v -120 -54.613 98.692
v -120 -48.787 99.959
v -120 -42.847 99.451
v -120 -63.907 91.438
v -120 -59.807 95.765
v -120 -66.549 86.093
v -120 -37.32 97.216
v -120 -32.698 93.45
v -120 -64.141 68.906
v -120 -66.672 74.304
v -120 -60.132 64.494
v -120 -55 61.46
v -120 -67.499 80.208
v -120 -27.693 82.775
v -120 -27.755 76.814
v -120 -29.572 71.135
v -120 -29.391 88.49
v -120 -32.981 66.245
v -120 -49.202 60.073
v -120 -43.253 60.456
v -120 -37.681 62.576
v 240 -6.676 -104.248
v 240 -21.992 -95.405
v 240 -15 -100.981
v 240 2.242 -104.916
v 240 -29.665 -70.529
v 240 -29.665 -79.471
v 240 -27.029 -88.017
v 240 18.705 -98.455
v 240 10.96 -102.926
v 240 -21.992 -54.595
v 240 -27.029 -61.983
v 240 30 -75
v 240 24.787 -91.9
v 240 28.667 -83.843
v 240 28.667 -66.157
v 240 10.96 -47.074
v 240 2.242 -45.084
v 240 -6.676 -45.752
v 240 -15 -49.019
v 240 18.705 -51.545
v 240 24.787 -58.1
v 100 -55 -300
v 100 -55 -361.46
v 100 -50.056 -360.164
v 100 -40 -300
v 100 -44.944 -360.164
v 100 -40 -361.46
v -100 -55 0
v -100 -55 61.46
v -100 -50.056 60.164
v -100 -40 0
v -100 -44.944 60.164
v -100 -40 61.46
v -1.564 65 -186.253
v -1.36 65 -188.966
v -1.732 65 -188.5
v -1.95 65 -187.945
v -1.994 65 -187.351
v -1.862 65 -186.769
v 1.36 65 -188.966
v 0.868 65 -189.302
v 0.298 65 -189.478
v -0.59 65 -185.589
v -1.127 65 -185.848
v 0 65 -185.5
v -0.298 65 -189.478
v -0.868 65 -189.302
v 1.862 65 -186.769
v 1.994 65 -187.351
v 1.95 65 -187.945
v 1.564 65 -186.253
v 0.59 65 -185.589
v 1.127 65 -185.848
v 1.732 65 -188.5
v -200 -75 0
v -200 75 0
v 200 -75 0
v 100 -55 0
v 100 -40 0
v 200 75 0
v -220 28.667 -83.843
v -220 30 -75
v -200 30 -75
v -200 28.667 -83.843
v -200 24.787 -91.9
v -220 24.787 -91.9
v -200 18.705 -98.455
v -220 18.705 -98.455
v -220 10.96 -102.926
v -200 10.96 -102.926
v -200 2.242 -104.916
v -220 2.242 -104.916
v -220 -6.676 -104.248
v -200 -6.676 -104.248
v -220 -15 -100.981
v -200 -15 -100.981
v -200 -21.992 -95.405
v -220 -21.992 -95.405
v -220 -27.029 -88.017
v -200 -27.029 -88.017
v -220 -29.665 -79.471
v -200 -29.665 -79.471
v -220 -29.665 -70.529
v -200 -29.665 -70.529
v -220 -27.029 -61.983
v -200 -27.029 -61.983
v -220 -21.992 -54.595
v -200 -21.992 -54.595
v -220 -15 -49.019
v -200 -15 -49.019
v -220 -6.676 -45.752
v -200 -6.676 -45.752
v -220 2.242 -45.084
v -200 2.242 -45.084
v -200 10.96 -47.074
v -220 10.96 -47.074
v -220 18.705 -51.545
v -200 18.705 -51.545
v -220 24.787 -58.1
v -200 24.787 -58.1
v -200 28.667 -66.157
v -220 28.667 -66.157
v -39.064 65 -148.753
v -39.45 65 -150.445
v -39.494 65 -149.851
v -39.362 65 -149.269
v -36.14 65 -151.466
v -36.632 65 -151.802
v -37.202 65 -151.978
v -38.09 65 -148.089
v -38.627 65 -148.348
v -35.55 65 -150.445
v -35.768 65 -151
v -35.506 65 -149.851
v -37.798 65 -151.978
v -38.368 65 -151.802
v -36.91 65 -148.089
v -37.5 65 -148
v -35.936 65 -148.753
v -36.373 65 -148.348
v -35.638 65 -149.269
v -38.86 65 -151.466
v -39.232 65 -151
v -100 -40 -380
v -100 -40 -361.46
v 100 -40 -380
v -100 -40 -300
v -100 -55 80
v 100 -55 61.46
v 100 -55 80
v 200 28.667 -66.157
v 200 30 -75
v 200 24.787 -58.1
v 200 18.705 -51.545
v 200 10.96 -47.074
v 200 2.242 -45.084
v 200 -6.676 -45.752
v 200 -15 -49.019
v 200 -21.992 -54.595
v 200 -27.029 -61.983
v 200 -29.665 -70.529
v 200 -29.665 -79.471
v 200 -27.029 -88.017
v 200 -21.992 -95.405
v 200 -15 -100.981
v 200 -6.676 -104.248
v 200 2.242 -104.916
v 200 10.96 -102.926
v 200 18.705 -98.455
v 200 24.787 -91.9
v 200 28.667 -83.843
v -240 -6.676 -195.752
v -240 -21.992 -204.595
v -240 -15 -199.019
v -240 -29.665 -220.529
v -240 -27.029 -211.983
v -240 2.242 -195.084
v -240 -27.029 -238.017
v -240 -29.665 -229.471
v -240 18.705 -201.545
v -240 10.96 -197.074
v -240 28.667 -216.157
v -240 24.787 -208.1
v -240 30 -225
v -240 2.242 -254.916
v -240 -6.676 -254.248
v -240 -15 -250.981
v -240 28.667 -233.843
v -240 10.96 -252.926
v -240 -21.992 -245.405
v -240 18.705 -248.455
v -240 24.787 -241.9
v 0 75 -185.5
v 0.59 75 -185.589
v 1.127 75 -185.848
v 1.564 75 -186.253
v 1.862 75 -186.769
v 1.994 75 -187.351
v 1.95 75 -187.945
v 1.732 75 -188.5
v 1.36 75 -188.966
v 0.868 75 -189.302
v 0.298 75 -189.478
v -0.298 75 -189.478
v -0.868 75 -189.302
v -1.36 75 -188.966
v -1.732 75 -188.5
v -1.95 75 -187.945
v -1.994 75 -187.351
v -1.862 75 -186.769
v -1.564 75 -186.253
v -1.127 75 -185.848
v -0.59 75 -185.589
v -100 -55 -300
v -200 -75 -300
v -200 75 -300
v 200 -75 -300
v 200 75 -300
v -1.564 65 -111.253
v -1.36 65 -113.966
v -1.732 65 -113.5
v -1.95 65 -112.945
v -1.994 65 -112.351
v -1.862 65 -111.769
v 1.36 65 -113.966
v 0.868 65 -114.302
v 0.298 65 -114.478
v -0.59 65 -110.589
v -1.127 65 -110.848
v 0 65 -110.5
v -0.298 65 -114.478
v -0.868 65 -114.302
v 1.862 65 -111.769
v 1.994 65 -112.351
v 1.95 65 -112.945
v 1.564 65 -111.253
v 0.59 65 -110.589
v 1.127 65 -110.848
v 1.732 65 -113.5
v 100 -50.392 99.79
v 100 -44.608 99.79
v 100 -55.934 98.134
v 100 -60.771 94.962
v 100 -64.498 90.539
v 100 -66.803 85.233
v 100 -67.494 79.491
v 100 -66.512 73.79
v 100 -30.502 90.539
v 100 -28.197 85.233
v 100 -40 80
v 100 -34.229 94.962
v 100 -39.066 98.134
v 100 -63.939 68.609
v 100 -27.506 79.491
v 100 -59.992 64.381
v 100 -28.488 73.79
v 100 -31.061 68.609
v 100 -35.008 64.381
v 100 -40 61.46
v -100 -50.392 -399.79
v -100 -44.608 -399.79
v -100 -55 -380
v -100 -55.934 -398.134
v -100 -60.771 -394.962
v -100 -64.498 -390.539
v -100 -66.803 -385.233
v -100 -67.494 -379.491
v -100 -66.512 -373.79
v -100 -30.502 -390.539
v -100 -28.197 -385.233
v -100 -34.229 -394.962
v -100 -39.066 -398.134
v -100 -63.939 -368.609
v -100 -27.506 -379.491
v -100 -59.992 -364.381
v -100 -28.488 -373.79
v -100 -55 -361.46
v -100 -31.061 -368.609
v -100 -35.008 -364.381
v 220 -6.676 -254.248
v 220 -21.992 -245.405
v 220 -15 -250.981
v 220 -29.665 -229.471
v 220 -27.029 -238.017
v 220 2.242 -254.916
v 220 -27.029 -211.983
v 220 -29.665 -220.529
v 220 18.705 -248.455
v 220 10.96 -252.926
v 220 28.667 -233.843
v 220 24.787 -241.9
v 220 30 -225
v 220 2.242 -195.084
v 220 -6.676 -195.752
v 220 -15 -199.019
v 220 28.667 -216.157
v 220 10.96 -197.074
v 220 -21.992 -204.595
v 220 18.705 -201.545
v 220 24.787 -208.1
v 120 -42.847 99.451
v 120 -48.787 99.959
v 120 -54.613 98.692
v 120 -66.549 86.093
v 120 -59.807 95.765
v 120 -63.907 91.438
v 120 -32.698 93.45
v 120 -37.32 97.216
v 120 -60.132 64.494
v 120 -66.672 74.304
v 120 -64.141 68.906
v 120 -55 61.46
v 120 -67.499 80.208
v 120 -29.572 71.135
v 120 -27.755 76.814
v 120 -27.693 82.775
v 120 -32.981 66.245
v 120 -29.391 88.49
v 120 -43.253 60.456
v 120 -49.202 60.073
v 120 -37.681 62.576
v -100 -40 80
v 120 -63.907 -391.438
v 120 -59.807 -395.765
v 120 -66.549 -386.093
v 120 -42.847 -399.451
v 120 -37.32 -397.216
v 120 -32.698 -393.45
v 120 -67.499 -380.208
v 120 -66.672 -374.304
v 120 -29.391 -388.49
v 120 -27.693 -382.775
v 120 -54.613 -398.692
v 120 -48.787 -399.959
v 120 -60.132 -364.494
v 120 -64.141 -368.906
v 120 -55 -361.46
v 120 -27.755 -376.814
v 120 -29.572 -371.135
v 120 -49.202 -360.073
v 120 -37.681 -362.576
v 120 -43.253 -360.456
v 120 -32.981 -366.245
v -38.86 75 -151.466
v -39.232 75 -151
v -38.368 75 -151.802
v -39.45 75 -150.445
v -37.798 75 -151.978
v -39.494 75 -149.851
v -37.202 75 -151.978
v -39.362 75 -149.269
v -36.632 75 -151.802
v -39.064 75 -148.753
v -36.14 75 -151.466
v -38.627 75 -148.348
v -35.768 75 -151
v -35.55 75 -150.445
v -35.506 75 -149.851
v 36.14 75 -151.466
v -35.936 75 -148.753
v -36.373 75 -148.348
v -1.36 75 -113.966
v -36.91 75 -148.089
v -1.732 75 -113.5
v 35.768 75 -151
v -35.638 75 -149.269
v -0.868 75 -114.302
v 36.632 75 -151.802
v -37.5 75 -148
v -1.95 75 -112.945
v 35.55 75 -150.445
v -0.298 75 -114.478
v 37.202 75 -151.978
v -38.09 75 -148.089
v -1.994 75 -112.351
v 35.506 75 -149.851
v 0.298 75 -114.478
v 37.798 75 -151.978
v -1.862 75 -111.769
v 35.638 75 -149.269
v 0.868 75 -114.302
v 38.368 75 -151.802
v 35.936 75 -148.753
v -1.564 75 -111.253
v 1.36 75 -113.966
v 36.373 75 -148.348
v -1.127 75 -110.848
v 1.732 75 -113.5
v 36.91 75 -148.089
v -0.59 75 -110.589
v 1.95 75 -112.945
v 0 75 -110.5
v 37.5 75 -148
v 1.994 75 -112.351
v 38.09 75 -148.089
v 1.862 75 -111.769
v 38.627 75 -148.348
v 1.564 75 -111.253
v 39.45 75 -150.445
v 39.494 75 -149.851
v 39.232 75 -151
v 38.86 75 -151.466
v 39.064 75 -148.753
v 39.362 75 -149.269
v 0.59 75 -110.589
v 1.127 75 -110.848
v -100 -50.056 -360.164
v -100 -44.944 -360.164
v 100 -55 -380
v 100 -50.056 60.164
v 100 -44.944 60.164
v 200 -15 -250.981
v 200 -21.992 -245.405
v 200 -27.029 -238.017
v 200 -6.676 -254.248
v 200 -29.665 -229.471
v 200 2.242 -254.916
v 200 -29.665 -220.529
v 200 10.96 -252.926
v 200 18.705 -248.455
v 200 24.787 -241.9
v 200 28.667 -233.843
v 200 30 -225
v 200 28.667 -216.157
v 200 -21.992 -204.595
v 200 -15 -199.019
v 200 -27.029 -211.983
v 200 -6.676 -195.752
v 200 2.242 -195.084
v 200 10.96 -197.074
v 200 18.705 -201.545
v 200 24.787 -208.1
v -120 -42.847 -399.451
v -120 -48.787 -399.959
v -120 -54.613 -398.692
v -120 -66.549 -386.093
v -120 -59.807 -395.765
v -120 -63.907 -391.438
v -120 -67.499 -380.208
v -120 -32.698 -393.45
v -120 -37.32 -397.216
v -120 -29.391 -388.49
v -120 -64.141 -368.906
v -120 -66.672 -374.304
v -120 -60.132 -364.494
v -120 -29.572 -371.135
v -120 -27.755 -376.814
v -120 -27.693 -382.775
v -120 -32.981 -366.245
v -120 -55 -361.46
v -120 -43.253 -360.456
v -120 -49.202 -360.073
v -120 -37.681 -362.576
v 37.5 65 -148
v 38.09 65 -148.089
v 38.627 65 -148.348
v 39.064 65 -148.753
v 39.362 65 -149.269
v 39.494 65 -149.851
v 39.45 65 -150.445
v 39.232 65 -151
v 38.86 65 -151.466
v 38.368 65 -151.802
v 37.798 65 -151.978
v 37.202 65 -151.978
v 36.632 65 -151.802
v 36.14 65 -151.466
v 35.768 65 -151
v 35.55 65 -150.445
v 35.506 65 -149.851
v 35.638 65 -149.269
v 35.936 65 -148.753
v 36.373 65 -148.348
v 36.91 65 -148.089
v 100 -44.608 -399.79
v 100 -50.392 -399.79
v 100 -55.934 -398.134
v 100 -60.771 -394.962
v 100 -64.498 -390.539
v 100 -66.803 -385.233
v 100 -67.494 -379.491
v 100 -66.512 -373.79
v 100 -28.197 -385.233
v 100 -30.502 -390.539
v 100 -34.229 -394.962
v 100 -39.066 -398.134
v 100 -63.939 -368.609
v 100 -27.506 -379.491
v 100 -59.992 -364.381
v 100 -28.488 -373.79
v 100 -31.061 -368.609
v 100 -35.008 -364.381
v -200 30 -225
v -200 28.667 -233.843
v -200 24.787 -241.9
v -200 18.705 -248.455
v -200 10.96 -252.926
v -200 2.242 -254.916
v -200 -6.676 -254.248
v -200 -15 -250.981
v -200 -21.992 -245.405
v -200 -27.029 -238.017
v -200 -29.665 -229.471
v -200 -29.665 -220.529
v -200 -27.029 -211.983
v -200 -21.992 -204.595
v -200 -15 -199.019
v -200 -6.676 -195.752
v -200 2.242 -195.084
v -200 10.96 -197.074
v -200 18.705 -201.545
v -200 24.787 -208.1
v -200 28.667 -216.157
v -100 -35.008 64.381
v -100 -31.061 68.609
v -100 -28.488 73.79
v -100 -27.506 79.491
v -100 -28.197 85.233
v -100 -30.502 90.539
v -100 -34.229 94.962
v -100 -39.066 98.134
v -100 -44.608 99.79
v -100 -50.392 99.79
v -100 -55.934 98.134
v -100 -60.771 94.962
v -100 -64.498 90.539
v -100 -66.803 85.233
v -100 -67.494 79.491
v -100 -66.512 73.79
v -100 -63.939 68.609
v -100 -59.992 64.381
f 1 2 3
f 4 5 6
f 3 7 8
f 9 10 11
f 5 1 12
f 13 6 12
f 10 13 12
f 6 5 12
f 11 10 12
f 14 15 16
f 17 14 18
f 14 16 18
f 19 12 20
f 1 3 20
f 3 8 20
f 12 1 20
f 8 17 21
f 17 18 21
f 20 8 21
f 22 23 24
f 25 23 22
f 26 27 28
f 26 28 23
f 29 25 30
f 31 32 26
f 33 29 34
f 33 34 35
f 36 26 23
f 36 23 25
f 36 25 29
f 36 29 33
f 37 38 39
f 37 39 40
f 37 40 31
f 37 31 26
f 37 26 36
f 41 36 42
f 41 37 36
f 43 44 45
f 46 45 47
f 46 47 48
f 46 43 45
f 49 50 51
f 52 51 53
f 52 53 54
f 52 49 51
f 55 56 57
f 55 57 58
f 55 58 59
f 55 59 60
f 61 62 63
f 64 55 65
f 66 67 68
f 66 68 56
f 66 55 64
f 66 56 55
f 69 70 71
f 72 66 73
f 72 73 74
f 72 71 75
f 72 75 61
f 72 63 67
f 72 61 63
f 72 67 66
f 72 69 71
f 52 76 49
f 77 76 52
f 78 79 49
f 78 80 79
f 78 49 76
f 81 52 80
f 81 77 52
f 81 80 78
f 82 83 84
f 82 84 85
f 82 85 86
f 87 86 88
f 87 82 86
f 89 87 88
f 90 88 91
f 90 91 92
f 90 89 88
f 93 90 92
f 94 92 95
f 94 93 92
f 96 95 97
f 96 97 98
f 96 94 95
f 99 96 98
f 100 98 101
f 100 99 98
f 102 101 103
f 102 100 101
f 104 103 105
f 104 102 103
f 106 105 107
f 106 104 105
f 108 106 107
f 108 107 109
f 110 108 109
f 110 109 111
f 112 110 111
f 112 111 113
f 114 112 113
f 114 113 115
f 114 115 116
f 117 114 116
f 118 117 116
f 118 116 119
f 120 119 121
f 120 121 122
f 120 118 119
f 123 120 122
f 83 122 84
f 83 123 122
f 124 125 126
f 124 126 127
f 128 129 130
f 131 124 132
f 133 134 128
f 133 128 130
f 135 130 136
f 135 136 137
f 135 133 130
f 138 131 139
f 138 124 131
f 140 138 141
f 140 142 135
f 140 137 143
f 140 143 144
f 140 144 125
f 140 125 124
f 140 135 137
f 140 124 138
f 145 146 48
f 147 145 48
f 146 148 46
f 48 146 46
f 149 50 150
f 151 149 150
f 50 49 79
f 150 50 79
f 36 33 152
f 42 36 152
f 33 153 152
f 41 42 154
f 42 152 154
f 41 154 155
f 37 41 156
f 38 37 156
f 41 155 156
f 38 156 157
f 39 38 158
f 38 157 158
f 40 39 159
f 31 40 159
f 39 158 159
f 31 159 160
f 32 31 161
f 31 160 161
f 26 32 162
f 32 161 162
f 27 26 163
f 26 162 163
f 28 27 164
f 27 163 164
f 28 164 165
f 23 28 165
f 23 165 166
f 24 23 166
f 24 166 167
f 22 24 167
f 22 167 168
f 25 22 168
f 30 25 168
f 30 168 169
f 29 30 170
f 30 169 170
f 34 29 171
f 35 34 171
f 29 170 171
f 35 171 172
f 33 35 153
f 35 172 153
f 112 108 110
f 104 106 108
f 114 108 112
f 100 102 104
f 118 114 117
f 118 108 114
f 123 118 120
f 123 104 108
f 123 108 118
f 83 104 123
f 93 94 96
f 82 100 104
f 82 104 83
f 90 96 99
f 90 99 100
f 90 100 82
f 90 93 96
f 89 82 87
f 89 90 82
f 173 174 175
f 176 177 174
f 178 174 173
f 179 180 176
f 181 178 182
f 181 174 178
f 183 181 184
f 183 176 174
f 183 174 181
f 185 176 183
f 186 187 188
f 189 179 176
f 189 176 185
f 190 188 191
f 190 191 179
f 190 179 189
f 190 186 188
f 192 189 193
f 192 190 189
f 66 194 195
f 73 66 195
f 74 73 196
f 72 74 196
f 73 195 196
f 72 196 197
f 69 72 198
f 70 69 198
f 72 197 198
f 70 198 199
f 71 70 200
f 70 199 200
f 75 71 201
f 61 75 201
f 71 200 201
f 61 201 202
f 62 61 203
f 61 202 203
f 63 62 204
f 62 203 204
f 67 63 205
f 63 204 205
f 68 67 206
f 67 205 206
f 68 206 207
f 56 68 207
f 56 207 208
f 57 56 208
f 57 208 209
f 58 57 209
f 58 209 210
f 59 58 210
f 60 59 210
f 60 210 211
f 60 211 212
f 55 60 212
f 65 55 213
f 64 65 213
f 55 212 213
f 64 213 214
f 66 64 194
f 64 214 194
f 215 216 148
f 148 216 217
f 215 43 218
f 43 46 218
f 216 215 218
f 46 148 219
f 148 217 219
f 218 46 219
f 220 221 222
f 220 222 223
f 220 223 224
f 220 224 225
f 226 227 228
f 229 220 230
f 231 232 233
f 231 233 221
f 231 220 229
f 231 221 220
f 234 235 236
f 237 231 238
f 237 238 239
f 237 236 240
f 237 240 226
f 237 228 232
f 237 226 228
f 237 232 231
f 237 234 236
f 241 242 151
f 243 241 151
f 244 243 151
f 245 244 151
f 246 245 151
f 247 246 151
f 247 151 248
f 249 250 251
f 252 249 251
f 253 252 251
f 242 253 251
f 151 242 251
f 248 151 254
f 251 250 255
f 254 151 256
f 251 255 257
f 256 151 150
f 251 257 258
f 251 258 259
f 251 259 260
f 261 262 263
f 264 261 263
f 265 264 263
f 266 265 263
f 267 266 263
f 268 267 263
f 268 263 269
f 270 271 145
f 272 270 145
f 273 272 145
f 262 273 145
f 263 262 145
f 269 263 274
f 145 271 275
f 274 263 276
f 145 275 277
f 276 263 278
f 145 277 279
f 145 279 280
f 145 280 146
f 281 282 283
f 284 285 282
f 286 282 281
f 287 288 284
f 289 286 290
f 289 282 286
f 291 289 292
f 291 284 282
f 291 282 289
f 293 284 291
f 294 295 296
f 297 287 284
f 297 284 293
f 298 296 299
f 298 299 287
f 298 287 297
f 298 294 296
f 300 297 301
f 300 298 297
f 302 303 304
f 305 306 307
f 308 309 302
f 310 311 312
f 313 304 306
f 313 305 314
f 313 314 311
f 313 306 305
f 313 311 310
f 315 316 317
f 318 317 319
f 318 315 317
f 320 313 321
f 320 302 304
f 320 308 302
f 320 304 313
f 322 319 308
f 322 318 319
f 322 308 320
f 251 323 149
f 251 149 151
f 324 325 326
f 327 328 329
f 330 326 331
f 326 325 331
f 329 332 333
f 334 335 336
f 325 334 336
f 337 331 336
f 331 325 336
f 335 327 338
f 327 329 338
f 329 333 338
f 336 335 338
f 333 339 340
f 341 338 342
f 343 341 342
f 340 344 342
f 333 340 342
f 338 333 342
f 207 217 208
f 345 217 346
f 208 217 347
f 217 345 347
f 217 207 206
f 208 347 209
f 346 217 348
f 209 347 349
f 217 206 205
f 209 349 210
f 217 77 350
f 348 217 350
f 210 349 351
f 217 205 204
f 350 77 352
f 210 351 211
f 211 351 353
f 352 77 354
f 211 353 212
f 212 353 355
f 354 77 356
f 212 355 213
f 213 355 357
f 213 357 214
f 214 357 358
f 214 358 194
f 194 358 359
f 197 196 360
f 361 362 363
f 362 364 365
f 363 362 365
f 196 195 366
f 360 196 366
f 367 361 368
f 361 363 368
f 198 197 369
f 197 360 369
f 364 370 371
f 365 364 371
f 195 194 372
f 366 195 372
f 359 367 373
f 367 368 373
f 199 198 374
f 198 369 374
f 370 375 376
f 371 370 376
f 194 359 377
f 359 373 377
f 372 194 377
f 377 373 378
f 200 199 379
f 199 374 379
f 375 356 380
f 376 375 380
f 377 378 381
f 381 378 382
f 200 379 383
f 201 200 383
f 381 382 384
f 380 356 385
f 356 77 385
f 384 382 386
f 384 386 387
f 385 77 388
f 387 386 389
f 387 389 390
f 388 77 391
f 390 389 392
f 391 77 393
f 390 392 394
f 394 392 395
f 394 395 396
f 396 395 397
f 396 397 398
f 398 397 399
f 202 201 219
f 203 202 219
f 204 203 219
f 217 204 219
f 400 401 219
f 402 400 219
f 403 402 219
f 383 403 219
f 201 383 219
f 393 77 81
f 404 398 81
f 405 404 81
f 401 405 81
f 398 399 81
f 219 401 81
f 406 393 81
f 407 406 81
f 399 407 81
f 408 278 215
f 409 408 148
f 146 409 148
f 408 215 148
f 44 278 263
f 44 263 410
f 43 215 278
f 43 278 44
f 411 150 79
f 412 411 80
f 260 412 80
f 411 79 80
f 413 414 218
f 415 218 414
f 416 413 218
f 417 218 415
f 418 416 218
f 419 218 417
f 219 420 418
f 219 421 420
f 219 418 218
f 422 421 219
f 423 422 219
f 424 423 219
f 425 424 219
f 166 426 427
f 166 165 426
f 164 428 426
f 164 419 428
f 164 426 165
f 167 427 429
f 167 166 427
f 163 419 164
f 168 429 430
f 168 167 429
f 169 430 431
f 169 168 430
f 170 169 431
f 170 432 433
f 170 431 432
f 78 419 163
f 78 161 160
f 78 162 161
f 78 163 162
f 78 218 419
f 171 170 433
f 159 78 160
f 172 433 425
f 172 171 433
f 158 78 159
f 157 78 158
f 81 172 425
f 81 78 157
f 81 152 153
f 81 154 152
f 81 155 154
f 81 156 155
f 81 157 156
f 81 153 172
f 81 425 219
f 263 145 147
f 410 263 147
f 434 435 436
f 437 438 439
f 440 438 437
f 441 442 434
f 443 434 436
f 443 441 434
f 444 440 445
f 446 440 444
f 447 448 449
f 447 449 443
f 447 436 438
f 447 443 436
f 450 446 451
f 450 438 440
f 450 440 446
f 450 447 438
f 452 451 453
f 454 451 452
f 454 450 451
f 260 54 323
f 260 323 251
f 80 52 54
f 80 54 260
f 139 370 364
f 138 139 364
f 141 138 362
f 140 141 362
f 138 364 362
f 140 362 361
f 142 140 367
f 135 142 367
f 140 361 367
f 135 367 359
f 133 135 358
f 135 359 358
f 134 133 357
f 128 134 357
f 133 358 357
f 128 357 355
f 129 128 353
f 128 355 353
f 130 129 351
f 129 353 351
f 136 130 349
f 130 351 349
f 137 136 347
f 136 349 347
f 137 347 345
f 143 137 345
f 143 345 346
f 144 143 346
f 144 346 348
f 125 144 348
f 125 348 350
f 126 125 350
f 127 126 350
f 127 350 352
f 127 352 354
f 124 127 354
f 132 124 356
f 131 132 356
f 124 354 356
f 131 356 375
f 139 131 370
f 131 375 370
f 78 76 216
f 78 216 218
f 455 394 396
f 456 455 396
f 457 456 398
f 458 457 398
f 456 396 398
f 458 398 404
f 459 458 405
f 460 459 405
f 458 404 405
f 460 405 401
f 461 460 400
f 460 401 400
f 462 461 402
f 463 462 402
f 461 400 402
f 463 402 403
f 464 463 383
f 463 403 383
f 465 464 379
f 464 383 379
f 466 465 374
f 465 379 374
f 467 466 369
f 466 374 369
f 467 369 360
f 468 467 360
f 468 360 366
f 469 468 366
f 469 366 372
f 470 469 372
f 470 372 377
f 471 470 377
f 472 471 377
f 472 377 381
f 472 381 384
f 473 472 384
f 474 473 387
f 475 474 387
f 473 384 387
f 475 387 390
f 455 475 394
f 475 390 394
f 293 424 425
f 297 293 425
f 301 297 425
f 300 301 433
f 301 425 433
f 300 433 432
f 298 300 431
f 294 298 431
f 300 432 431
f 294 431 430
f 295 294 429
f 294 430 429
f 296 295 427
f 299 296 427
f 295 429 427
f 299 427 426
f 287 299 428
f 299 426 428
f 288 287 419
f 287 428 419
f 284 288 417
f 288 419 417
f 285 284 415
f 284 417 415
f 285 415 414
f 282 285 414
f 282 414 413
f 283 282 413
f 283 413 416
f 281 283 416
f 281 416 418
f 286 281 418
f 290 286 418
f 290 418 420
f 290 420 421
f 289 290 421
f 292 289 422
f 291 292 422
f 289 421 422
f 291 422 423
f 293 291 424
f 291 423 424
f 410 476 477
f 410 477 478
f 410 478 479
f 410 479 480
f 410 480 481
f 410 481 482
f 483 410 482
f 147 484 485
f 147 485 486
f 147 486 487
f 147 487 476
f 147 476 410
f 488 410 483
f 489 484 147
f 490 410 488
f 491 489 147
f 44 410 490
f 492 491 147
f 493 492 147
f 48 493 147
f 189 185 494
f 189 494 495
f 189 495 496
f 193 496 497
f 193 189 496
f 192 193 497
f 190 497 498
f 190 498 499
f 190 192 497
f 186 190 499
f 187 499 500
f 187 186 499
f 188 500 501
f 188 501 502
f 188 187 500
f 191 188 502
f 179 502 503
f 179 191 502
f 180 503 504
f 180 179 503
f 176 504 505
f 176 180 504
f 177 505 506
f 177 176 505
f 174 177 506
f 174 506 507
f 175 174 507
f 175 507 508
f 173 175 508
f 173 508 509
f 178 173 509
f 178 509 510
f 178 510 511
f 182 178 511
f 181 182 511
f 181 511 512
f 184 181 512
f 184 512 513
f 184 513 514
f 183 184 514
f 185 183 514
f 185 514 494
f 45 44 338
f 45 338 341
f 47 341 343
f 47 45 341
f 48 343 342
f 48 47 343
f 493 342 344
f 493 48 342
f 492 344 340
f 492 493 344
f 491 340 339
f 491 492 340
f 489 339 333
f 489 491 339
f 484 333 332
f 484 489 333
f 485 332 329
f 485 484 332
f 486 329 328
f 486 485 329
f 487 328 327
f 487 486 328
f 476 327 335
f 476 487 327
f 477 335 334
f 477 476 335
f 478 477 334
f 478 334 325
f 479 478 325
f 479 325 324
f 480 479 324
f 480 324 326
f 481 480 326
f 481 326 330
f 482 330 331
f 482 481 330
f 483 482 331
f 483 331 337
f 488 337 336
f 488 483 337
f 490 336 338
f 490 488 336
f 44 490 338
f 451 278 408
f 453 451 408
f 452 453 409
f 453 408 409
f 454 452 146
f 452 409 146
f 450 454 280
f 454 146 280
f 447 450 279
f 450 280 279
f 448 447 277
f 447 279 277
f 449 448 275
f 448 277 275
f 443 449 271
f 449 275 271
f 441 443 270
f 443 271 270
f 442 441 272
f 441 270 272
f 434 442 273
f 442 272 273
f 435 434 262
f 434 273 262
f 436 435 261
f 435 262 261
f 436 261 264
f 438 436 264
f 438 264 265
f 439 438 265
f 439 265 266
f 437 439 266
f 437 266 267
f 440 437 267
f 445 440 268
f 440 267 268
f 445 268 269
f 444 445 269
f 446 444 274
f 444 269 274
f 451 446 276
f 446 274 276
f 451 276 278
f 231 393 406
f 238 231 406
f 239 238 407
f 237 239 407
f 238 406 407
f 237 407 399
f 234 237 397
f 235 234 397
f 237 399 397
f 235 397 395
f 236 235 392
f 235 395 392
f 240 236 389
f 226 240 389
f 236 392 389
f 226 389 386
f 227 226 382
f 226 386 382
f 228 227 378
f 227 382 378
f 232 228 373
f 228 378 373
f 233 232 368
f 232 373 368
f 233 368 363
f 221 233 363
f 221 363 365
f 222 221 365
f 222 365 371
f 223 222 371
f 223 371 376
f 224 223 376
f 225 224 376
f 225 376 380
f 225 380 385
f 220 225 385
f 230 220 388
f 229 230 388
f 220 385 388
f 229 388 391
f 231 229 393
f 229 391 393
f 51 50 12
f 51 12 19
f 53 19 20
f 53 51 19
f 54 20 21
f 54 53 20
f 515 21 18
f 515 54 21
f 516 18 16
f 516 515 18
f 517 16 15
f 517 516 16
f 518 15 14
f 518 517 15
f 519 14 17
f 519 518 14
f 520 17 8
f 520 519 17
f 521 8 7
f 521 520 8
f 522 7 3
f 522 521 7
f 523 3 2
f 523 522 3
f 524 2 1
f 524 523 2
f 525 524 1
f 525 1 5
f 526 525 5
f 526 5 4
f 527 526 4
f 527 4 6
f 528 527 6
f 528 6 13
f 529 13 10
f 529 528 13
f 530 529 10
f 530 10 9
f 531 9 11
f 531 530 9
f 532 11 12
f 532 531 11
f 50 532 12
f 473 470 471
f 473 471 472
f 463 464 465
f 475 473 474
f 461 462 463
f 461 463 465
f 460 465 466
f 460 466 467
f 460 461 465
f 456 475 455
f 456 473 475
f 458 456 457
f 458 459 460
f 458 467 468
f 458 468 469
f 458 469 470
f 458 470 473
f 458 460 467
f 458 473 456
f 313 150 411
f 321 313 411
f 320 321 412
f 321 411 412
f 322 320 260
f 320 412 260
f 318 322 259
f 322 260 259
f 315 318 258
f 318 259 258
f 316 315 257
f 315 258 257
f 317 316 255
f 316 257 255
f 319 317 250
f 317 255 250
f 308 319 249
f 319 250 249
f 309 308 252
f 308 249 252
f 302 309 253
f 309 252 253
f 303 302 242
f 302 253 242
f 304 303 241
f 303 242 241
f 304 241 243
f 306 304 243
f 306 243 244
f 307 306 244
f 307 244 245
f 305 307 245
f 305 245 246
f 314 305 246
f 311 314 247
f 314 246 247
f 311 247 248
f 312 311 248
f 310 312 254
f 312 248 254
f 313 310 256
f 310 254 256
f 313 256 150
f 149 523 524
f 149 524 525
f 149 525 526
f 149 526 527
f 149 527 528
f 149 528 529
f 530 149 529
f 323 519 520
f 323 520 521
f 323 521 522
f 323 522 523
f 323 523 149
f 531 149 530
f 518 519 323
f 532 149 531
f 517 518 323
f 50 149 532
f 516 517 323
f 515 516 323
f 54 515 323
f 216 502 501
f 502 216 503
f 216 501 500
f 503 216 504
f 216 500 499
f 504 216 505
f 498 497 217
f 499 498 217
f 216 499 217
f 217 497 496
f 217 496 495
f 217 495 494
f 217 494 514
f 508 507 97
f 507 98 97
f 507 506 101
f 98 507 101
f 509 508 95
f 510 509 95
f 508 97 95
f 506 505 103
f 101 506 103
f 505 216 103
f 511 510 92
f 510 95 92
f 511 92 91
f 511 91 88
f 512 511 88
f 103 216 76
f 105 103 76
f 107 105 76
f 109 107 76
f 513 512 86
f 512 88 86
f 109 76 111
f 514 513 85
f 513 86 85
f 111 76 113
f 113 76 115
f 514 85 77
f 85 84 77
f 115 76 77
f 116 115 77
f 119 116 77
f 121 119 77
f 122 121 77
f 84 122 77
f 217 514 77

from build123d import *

# Parameters (mm, degrees)
SKETCH_1_W               = 400
SKETCH_1_H               = 150
EXTRUDE_1_DEPTH          = 300
SKETCH_2_R               = 30
EXTRUDE_2_DEPTH          = 20
SKETCH_3_R               = 30
EXTRUDE_3_DEPTH          = 20
EXTRUDE_START            = 20
SKETCH_6_R               = 30
EXTRUDE_4_DEPTH          = 20
SKETCH_7_R               = 30
EXTRUDE_5_DEPTH          = 20
SKETCH_8_W               = 200
SKETCH_8_H               = 15
EXTRUDE_6_DEPTH          = 80
SKETCH_9_R               = 20
EXTRUDE_7_DEPTH          = 20
MIRROR_4_COPY_1_SKETCH_R = 20
MIRROR_4_COPY_1_DEPTH    = 20
SKETCH_10_R              = 2
CUT_EXTRUDE_1_DEPTH      = 10


with BuildPart() as part:
    # 草图1 → 凸台-拉伸1 (new body)
    with BuildSketch(Plane.XY):
        Rectangle(SKETCH_1_W, SKETCH_1_H)
    extrude(amount=-EXTRUDE_1_DEPTH)

    # 草图2 → 凸台-拉伸2 (add)
    with BuildSketch(Plane(origin=(200, 0, 0), x_dir=(0, 0, -1), z_dir=(1, 0, 0))):
        with Locations(Location((75, 0, 0), (0, 0, 90))):
            Circle(SKETCH_2_R)
        with Locations(Location((225, 0, 0), (0, 0, 90))):
            Circle(SKETCH_2_R)
    extrude(amount=EXTRUDE_2_DEPTH)

    # 草图3 → 凸台-拉伸3 (add)
    with BuildSketch(Plane(origin=(220, 0, 0), x_dir=(0, 0, -1), z_dir=(1, 0, 0))):
        with Locations(Location((75, 0, 0), (0, 0, 90))):
            Circle(SKETCH_3_R)
    extrude(amount=EXTRUDE_3_DEPTH)

    # 草图6 → 凸台-拉伸4 (add)
    with BuildSketch(Plane.ZY.offset(200).offset(EXTRUDE_START)):
        with Locations(Location((-225, 0, 0), (0, 0, 90))):
            Circle(SKETCH_6_R)
        with Locations(Location((-75, 0, 0), (0, 0, 90))):
            Circle(SKETCH_6_R)
    extrude(amount=-EXTRUDE_4_DEPTH)

    # 草图7 → 凸台-拉伸5 (add)
    with BuildSketch(Plane.ZY.offset(220).offset(EXTRUDE_START)):
        with Locations(Location((-225, 0, 0), (0, 0, 90))):
            Circle(SKETCH_7_R)
    extrude(amount=-EXTRUDE_5_DEPTH)

    # 草图8 → 凸台-拉伸6 (add)
    with BuildSketch(Plane.XY):
        with Locations((0, -47.5)):
            Rectangle(SKETCH_8_W, SKETCH_8_H)
    extrude_6 = extrude(amount=EXTRUDE_6_DEPTH)

    # 镜向2: 凸台-拉伸6 across plane
    add(extrude_6.mirror(Plane.XY.offset(-150)))

    # 草图9 → 凸台-拉伸7 (add)
    with BuildSketch(Plane(origin=(100, 0, 0), x_dir=(0, 0, -1), z_dir=(1, 0, 0))):
        with Locations(Location((-80, -47.5, 0), (0, 0, 337.975687163))):
            Circle(SKETCH_9_R)
    extrude_7 = extrude(amount=EXTRUDE_7_DEPTH)

    # 镜向3: 凸台-拉伸7 across plane
    add(extrude_7.mirror(Plane.XY.offset(-150)))

    # 镜向4: 凸台-拉伸7 across plane
    add(extrude_7.mirror(Plane(origin=(0, 0, 0), x_dir=(0, 0, 1), z_dir=(1, 0, 0))))

    # 镜向4 copy 1 sketch → 镜向4 copy 1 (add)
    with BuildSketch(Plane(origin=(-100, 0, -300), x_dir=(0, 0, 1), z_dir=(-1, 0, 0))):
        with Locations(Location((-80, -47.5, 0), (0, 0, 337.975687163))):
            Circle(MIRROR_4_COPY_1_SKETCH_R)
    extrude(amount=MIRROR_4_COPY_1_DEPTH)

    # 草图10 → 切除-拉伸1 (cut)
    with BuildSketch(Plane(origin=(0, 75, 0), x_dir=(1, 0, 0), z_dir=(0, 1, 0))):
        with Locations(Location((0, 187.5, 0), (0, 0, 270))):
            Circle(SKETCH_10_R)
        with Locations(Location((37.5, 150, 0), (0, 0, 270))):
            Circle(SKETCH_10_R)
        with Locations(Location((0, 112.5, 0), (0, 0, 270))):
            Circle(SKETCH_10_R)
        with Locations(Location((-37.5, 150, 0), (0, 0, 270))):
            Circle(SKETCH_10_R)
    extrude(amount=-CUT_EXTRUDE_1_DEPTH, mode=Mode.SUBTRACT)


solid = part.part
